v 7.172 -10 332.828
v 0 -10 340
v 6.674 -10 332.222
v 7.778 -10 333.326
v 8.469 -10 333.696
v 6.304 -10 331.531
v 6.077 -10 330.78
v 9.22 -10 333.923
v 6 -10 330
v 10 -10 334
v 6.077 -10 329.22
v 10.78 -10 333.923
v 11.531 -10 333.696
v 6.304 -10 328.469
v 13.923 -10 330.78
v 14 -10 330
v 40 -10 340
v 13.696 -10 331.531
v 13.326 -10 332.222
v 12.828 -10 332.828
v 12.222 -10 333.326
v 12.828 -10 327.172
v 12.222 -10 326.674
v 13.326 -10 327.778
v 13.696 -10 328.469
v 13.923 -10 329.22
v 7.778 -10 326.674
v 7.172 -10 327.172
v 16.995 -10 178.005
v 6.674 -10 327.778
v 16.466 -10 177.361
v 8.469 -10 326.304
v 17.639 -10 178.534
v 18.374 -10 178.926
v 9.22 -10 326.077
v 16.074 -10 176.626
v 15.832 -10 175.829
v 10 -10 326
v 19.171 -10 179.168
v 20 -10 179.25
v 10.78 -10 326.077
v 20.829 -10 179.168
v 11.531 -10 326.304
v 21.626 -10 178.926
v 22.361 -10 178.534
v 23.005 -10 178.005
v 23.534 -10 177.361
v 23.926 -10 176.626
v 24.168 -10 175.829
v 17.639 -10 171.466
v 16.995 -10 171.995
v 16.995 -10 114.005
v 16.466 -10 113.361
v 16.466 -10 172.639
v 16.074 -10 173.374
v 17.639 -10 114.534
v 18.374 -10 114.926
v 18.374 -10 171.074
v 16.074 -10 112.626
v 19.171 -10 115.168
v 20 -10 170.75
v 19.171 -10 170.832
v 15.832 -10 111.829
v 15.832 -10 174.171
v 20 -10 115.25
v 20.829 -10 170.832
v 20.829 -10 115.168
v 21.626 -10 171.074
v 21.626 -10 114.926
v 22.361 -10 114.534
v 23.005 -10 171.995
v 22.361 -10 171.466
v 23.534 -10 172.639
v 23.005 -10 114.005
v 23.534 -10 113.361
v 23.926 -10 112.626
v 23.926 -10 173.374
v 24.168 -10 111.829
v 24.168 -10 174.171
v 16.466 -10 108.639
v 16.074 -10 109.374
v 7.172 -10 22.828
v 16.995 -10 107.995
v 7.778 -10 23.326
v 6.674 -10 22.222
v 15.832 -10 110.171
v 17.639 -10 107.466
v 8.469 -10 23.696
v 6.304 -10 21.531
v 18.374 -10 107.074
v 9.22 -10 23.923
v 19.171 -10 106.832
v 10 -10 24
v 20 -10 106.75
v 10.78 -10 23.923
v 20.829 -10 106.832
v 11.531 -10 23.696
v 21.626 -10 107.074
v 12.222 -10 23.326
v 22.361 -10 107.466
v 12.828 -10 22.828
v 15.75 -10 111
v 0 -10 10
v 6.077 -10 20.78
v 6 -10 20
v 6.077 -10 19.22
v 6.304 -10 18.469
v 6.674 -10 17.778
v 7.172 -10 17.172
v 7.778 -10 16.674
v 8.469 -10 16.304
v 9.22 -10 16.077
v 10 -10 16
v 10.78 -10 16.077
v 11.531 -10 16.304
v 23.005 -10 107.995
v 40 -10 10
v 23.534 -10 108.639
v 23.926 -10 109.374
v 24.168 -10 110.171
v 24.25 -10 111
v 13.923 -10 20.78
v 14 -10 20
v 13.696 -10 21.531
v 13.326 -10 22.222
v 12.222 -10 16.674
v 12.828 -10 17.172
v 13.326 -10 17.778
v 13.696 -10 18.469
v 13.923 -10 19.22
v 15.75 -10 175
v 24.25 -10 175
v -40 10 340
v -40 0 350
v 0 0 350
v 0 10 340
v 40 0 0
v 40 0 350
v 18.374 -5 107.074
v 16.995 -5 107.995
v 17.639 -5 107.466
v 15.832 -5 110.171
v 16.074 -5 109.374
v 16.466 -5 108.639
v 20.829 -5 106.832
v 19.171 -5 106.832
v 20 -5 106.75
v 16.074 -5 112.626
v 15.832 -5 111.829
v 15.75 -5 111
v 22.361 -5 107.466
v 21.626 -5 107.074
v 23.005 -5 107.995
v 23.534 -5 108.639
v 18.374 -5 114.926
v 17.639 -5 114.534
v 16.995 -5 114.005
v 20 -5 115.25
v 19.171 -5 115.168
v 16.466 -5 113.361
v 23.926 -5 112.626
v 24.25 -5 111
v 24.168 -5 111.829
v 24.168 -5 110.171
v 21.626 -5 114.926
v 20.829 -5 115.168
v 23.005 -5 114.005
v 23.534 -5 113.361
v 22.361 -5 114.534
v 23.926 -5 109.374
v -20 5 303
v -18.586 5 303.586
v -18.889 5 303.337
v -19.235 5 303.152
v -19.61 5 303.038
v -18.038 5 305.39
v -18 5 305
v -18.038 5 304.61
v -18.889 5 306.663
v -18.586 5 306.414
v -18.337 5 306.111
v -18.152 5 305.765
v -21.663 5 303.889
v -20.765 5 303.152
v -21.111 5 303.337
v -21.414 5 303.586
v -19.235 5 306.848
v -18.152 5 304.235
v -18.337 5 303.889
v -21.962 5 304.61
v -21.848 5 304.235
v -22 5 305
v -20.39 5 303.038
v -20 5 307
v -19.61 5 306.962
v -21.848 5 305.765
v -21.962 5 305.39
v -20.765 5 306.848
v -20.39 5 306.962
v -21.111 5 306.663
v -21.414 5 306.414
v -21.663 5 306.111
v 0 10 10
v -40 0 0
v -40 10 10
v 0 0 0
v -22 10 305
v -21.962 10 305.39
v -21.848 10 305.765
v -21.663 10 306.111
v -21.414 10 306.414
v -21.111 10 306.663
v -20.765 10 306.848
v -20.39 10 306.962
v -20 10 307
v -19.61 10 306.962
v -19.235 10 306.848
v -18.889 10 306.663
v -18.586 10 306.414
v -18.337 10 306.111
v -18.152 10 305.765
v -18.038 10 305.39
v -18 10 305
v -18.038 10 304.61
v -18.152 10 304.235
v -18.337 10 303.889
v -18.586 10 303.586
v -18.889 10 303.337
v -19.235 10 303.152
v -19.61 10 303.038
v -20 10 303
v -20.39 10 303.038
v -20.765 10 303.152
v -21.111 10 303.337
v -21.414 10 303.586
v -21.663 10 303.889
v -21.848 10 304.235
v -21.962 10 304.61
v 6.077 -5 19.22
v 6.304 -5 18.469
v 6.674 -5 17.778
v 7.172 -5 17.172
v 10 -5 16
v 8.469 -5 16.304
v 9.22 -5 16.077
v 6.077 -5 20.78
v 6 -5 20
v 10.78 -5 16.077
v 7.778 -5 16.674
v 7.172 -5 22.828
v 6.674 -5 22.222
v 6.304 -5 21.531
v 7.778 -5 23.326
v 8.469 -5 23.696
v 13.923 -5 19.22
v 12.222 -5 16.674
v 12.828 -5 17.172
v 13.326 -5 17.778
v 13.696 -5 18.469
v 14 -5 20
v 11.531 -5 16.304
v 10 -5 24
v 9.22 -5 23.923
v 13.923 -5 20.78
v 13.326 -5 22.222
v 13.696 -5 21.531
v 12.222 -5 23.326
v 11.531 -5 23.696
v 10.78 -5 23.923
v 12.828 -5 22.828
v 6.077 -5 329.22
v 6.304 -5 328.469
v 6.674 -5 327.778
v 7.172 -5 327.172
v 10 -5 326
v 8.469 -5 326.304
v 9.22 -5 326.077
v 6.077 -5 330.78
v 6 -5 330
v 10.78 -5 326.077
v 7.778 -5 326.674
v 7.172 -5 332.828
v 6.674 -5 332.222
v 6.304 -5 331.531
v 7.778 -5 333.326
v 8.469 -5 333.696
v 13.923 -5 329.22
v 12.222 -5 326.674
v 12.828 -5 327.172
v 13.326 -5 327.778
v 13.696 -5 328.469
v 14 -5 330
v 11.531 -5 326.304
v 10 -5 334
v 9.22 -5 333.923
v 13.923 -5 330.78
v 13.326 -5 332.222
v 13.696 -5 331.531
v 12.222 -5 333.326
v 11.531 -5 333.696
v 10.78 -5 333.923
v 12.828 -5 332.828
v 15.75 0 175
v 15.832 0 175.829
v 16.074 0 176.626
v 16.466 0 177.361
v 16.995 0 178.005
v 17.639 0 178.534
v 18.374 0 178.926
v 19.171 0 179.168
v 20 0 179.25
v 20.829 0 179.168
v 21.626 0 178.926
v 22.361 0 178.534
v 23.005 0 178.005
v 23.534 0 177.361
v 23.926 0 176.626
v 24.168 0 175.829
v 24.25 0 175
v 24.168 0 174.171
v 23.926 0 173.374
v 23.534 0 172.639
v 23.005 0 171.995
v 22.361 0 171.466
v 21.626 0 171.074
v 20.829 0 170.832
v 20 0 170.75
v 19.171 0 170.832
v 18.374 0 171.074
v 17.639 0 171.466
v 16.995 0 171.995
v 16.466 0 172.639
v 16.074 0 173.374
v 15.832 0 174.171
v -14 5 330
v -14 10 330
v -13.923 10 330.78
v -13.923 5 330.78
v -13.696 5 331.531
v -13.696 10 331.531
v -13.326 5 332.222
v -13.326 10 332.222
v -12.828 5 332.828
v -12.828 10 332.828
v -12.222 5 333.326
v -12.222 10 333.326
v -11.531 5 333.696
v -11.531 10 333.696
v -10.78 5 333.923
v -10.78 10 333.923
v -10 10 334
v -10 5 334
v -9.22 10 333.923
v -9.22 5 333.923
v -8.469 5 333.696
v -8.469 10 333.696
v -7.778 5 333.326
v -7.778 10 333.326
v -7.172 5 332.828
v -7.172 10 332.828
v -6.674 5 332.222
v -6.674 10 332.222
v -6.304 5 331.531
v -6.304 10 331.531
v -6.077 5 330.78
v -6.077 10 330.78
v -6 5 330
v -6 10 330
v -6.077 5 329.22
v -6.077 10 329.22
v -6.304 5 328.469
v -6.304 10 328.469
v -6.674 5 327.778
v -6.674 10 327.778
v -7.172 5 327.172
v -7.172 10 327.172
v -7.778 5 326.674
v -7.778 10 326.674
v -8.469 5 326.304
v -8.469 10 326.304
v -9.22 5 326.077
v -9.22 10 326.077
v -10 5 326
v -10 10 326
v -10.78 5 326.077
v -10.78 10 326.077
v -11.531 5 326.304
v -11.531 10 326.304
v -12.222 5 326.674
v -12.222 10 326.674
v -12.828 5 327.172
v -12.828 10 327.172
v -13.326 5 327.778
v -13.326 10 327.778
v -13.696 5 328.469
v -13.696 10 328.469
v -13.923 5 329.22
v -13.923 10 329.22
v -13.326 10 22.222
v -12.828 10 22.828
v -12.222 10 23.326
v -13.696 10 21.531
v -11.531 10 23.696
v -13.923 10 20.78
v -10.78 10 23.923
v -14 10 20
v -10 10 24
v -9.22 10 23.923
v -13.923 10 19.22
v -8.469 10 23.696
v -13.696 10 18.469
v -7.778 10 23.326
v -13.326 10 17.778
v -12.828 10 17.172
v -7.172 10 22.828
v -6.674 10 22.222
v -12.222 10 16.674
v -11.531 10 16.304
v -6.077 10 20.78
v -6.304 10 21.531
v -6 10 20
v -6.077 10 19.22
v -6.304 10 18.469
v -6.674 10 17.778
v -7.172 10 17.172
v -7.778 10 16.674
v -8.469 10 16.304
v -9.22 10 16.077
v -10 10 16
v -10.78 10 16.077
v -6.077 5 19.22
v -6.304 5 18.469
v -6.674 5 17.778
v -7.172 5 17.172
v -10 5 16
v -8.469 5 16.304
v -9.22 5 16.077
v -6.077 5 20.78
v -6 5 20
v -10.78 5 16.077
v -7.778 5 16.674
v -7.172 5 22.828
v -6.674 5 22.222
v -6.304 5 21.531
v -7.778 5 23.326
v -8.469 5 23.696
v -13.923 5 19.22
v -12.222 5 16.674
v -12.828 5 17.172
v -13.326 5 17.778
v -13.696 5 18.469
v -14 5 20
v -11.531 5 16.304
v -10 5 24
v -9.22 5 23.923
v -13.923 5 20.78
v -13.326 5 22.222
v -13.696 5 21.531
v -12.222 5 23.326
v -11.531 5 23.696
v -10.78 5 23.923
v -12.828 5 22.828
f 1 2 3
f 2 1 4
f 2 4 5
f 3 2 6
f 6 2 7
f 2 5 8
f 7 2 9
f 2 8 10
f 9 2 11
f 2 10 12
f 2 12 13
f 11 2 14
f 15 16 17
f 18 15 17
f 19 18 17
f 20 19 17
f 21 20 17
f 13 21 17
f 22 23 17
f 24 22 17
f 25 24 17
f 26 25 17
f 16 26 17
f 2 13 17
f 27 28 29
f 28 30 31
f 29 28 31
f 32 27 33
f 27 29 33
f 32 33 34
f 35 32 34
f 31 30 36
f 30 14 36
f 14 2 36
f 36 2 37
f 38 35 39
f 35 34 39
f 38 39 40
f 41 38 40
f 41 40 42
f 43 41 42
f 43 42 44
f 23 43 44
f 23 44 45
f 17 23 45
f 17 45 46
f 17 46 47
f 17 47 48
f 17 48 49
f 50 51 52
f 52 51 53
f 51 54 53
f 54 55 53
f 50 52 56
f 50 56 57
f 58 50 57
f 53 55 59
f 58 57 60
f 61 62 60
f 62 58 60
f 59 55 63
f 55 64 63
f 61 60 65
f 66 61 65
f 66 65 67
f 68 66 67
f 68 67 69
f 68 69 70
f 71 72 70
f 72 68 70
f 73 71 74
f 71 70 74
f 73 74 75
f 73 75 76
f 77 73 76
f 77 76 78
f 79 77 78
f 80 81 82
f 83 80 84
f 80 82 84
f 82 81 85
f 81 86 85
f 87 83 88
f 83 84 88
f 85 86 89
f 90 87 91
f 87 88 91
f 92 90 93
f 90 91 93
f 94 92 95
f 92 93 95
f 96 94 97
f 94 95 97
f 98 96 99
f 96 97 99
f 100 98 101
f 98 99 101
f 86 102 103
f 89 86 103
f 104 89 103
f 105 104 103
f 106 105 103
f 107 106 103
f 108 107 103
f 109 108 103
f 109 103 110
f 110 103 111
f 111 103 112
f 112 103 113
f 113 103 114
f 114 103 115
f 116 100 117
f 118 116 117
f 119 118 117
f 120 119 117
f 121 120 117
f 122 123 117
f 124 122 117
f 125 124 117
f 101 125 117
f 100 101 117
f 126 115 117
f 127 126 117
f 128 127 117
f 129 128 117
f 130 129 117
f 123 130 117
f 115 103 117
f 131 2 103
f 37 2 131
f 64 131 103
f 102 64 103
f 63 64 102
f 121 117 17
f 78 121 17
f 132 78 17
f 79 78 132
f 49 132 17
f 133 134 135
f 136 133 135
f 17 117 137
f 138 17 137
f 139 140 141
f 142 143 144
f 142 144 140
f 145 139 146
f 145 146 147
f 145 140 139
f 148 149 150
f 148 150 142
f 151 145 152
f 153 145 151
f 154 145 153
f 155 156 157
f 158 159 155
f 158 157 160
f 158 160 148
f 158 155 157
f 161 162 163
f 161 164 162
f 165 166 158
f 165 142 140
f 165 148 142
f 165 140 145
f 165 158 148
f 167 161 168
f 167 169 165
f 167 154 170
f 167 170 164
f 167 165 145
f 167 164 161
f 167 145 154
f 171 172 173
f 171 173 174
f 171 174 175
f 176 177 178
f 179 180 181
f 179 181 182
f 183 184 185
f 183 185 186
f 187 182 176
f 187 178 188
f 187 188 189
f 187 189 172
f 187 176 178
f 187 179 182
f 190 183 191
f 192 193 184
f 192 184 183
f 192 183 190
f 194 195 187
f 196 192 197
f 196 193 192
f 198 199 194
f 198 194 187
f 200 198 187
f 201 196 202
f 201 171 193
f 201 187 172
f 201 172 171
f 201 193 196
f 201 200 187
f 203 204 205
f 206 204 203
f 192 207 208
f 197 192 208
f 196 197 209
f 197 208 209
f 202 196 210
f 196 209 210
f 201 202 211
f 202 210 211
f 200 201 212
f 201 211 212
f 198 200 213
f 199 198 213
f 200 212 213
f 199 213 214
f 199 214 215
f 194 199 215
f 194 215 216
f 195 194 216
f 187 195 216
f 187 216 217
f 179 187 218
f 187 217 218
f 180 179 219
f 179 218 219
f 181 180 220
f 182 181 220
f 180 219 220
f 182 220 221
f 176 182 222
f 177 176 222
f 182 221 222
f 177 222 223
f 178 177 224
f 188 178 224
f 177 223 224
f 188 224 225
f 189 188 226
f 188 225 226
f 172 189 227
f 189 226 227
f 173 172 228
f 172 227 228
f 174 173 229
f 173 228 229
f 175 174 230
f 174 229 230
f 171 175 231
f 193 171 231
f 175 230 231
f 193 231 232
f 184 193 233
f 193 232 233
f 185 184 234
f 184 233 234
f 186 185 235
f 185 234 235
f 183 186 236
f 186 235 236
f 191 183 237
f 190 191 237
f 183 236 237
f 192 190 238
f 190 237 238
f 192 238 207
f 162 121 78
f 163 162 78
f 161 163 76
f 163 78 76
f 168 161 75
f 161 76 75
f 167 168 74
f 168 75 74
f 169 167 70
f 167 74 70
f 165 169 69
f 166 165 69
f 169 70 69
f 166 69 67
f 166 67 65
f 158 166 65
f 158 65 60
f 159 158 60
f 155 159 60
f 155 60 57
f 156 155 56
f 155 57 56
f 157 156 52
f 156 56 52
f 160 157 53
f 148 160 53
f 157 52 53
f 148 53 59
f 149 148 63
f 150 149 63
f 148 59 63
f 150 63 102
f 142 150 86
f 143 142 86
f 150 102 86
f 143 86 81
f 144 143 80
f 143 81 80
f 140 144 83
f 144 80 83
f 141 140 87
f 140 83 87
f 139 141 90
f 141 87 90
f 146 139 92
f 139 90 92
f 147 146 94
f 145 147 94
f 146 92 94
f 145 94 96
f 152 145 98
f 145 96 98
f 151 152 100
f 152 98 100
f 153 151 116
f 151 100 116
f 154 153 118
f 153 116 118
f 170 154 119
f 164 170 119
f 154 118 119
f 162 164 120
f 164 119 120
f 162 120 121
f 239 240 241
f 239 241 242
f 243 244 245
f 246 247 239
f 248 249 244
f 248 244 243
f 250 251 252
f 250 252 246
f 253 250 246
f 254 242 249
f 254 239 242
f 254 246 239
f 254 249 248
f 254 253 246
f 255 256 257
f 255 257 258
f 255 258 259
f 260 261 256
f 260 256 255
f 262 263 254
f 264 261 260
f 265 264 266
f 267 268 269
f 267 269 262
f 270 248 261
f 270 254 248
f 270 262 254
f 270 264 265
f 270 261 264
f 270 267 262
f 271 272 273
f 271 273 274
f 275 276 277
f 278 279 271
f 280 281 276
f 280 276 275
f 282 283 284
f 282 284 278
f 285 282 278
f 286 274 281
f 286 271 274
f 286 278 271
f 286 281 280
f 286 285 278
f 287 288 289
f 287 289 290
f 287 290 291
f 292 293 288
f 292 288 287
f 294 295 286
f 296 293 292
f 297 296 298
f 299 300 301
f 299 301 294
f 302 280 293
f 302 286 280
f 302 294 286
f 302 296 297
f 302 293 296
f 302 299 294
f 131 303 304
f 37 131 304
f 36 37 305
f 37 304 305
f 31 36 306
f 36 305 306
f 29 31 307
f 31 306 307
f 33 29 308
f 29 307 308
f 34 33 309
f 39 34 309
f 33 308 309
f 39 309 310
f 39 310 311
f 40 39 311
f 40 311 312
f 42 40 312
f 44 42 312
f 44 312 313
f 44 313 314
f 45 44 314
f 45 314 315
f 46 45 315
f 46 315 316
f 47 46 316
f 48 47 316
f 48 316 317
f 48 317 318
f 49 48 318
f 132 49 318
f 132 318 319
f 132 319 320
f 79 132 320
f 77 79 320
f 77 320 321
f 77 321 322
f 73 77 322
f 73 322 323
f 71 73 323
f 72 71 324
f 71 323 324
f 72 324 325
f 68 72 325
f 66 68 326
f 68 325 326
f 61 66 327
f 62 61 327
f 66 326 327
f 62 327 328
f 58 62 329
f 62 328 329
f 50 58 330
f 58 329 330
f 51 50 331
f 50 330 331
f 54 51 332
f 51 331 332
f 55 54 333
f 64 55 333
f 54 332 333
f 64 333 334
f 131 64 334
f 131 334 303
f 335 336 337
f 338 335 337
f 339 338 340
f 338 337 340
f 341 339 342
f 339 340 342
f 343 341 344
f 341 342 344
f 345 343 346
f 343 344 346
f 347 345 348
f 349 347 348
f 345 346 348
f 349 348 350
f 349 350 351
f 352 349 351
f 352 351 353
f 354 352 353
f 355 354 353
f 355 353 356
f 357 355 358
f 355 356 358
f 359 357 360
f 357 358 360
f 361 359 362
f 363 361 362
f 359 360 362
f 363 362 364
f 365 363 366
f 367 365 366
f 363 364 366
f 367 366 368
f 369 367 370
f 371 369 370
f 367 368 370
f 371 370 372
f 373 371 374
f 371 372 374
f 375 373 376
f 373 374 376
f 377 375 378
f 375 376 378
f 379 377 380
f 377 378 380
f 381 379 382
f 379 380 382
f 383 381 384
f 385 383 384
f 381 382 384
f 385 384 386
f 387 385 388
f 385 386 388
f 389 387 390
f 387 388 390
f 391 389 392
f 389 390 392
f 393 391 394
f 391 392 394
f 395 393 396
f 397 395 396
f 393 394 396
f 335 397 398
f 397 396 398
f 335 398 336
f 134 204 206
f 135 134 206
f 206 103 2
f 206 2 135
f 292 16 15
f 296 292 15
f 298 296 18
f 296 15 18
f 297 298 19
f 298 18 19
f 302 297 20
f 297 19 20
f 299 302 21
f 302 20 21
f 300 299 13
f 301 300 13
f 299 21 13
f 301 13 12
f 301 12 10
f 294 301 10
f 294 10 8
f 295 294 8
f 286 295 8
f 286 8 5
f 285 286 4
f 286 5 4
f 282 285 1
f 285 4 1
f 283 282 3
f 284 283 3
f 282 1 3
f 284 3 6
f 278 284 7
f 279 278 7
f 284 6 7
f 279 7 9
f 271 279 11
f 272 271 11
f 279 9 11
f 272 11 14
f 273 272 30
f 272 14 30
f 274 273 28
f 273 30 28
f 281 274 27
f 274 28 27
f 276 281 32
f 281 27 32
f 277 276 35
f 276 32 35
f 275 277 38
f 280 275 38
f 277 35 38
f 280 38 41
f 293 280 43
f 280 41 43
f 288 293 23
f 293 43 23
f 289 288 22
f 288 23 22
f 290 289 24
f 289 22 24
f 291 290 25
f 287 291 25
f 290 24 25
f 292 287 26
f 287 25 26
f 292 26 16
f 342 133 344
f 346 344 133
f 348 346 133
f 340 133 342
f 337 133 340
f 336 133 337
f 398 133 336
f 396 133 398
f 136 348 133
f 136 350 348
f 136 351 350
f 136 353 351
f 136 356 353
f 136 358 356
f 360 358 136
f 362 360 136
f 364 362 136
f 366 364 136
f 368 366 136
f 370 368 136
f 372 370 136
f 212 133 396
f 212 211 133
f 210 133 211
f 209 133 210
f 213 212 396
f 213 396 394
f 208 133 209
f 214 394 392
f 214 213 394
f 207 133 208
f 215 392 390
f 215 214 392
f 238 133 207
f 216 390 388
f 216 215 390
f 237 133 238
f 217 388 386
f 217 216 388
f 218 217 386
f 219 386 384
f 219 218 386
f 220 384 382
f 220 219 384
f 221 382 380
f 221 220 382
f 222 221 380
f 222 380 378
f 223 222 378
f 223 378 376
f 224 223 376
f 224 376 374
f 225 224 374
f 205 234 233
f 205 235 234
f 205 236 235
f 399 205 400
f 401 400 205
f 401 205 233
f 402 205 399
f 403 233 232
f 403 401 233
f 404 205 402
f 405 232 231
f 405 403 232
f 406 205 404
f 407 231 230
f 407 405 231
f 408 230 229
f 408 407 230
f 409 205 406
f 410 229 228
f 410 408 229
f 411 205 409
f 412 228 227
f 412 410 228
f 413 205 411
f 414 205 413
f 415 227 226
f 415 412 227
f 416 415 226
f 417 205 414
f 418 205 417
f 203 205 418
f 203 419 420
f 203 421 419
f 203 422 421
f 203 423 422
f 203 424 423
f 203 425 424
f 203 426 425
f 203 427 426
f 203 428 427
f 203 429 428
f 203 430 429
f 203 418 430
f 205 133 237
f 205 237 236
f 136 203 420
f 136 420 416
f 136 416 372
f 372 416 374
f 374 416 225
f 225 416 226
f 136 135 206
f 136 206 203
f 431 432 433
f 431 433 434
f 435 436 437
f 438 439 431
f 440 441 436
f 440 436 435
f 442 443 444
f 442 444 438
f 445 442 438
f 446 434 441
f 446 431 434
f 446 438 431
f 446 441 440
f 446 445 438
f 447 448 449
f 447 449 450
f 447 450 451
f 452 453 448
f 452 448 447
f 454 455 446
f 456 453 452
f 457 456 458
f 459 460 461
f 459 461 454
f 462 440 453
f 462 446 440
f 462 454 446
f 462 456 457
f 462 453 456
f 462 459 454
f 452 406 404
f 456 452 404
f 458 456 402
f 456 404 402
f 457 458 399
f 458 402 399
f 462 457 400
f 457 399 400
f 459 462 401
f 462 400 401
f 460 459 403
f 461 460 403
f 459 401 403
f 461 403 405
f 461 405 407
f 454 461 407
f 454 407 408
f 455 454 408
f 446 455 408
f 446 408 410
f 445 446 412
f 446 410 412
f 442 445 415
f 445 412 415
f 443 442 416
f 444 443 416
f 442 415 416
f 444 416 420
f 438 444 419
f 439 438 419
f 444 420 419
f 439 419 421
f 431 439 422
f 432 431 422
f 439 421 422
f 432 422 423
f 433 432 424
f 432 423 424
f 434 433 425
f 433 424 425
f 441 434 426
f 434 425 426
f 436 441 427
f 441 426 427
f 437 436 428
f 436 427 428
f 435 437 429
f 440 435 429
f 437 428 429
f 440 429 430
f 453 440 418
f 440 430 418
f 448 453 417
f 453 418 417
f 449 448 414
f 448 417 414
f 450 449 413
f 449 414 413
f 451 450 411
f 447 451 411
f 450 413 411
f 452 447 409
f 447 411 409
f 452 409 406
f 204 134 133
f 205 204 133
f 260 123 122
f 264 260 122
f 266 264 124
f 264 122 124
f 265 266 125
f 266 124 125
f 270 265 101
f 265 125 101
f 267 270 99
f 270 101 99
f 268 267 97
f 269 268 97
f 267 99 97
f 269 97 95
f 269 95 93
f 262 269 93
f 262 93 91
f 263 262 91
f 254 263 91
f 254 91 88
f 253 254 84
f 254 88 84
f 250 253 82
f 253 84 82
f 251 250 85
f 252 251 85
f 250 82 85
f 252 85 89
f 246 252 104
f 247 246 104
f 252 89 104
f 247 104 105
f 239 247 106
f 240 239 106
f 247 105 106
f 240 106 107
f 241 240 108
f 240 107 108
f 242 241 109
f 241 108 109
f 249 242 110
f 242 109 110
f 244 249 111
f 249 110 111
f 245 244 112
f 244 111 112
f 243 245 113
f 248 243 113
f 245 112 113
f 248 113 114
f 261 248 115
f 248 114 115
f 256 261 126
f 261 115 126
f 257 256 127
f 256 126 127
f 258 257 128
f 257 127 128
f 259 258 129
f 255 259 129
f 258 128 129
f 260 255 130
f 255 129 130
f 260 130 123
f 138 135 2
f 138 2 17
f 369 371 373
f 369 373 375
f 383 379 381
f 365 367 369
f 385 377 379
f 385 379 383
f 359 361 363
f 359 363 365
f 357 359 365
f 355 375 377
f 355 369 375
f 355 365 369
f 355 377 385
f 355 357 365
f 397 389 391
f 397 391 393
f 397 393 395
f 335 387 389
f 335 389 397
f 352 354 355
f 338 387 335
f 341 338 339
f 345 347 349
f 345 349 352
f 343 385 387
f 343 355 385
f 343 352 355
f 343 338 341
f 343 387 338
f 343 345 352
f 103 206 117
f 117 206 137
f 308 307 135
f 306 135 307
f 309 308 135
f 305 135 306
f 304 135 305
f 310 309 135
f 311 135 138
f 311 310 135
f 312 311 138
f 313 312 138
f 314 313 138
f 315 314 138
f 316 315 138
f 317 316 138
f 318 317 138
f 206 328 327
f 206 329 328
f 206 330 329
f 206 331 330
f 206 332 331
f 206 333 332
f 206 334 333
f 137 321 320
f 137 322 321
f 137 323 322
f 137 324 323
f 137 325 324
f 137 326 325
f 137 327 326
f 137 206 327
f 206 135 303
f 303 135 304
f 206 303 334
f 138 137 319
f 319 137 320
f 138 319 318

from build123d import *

# Parameters (mm, degrees)
F0_W      = 40
F0_H      = 10
F1_DEPTH  = 350
F2_SIZE   = 9.99999
F3_SIZE   = 9.99999
F4_W      = 40
F4_H      = 10
F5_DEPTH  = 350
F6_SIZE   = 9.99999
F7_SIZE   = 9.99999
F8_R      = 4.25
F9_DEPTH  = 10.001
F10_R     = 2
F10_R_2   = 4
F11_DEPTH = 5
F12_R     = 4.25
F12_R_2   = 4
F13_DEPTH = 5


# Not quite as in the source:
# - a fillet or chamfer is up to 0.001 mm smaller than in the source, because OpenCascade refuses the exact size


with BuildPart() as f1:
    # F0 (on Top) → F1 (new body)
    with BuildSketch(Plane.XY):
        with Locations((-20, 5)):
            Rectangle(F0_W, F0_H)
    extrude(amount=F1_DEPTH)

    # F2 (size 10 in the source; OpenCascade refuses exactly that, so slightly less here)
    f2_edges = [f1.edges().sort_by_distance(p)[0] for p in [
        (-20, 10, 350),
    ]]
    chamfer(f2_edges, length=F2_SIZE)

    # F3 (size 10 in the source; OpenCascade refuses exactly that, so slightly less here)
    f3_edges = [f1.edges().sort_by_distance(p)[0] for p in [
        (-20, 10, 0),
    ]]
    chamfer(f3_edges, length=F3_SIZE)

    # F10 (on face) → F11 (cut)
    with BuildSketch(Plane(origin=(0, 10, 0), x_dir=(-1, 0, 0), z_dir=(0, 1, 0))):
        with Locations((20, 305)):
            Circle(F10_R)
        with Locations((10, 330)):
            Circle(F10_R_2)
        with Locations((10, 20)):
            Circle(F10_R_2)
    extrude(amount=-F11_DEPTH, mode=Mode.SUBTRACT)


with BuildPart() as f5:
    # F4 (on Top) → F5 (new body)
    with BuildSketch(Plane.XY):
        with Locations((20, -5)):
            Rectangle(F4_W, F4_H)
    extrude(amount=F5_DEPTH)

    # F6 (size 10 in the source; OpenCascade refuses exactly that, so slightly less here)
    f6_edges = [f5.edges().sort_by_distance(p)[0] for p in [
        (20, -10, 0),
    ]]
    chamfer(f6_edges, length=F6_SIZE)

    # F7 (size 10 in the source; OpenCascade refuses exactly that, so slightly less here)
    f7_edges = [f5.edges().sort_by_distance(p)[0] for p in [
        (20, -10, 350),
    ]]
    chamfer(f7_edges, length=F7_SIZE)

    # F8 (on face) → F9 (cut, through all)
    with BuildSketch(Plane(origin=(0, 0, 0), x_dir=(-1, 0, 0), z_dir=(0, 1, 0))):
        with Locations((-20, 175)):
            Circle(F8_R)
    extrude(amount=-F9_DEPTH, mode=Mode.SUBTRACT)

    # F12 (on face) → F13 (cut)
    with BuildSketch(Plane.XZ.offset(10)):
        with Locations((20, 111)):
            Circle(F12_R)
        with Locations((10, 20)):
            Circle(F12_R_2)
        with Locations((10, 330)):
            Circle(F12_R_2)
    extrude(amount=-F13_DEPTH, mode=Mode.SUBTRACT)


solid = Compound([f1.part, f5.part])
